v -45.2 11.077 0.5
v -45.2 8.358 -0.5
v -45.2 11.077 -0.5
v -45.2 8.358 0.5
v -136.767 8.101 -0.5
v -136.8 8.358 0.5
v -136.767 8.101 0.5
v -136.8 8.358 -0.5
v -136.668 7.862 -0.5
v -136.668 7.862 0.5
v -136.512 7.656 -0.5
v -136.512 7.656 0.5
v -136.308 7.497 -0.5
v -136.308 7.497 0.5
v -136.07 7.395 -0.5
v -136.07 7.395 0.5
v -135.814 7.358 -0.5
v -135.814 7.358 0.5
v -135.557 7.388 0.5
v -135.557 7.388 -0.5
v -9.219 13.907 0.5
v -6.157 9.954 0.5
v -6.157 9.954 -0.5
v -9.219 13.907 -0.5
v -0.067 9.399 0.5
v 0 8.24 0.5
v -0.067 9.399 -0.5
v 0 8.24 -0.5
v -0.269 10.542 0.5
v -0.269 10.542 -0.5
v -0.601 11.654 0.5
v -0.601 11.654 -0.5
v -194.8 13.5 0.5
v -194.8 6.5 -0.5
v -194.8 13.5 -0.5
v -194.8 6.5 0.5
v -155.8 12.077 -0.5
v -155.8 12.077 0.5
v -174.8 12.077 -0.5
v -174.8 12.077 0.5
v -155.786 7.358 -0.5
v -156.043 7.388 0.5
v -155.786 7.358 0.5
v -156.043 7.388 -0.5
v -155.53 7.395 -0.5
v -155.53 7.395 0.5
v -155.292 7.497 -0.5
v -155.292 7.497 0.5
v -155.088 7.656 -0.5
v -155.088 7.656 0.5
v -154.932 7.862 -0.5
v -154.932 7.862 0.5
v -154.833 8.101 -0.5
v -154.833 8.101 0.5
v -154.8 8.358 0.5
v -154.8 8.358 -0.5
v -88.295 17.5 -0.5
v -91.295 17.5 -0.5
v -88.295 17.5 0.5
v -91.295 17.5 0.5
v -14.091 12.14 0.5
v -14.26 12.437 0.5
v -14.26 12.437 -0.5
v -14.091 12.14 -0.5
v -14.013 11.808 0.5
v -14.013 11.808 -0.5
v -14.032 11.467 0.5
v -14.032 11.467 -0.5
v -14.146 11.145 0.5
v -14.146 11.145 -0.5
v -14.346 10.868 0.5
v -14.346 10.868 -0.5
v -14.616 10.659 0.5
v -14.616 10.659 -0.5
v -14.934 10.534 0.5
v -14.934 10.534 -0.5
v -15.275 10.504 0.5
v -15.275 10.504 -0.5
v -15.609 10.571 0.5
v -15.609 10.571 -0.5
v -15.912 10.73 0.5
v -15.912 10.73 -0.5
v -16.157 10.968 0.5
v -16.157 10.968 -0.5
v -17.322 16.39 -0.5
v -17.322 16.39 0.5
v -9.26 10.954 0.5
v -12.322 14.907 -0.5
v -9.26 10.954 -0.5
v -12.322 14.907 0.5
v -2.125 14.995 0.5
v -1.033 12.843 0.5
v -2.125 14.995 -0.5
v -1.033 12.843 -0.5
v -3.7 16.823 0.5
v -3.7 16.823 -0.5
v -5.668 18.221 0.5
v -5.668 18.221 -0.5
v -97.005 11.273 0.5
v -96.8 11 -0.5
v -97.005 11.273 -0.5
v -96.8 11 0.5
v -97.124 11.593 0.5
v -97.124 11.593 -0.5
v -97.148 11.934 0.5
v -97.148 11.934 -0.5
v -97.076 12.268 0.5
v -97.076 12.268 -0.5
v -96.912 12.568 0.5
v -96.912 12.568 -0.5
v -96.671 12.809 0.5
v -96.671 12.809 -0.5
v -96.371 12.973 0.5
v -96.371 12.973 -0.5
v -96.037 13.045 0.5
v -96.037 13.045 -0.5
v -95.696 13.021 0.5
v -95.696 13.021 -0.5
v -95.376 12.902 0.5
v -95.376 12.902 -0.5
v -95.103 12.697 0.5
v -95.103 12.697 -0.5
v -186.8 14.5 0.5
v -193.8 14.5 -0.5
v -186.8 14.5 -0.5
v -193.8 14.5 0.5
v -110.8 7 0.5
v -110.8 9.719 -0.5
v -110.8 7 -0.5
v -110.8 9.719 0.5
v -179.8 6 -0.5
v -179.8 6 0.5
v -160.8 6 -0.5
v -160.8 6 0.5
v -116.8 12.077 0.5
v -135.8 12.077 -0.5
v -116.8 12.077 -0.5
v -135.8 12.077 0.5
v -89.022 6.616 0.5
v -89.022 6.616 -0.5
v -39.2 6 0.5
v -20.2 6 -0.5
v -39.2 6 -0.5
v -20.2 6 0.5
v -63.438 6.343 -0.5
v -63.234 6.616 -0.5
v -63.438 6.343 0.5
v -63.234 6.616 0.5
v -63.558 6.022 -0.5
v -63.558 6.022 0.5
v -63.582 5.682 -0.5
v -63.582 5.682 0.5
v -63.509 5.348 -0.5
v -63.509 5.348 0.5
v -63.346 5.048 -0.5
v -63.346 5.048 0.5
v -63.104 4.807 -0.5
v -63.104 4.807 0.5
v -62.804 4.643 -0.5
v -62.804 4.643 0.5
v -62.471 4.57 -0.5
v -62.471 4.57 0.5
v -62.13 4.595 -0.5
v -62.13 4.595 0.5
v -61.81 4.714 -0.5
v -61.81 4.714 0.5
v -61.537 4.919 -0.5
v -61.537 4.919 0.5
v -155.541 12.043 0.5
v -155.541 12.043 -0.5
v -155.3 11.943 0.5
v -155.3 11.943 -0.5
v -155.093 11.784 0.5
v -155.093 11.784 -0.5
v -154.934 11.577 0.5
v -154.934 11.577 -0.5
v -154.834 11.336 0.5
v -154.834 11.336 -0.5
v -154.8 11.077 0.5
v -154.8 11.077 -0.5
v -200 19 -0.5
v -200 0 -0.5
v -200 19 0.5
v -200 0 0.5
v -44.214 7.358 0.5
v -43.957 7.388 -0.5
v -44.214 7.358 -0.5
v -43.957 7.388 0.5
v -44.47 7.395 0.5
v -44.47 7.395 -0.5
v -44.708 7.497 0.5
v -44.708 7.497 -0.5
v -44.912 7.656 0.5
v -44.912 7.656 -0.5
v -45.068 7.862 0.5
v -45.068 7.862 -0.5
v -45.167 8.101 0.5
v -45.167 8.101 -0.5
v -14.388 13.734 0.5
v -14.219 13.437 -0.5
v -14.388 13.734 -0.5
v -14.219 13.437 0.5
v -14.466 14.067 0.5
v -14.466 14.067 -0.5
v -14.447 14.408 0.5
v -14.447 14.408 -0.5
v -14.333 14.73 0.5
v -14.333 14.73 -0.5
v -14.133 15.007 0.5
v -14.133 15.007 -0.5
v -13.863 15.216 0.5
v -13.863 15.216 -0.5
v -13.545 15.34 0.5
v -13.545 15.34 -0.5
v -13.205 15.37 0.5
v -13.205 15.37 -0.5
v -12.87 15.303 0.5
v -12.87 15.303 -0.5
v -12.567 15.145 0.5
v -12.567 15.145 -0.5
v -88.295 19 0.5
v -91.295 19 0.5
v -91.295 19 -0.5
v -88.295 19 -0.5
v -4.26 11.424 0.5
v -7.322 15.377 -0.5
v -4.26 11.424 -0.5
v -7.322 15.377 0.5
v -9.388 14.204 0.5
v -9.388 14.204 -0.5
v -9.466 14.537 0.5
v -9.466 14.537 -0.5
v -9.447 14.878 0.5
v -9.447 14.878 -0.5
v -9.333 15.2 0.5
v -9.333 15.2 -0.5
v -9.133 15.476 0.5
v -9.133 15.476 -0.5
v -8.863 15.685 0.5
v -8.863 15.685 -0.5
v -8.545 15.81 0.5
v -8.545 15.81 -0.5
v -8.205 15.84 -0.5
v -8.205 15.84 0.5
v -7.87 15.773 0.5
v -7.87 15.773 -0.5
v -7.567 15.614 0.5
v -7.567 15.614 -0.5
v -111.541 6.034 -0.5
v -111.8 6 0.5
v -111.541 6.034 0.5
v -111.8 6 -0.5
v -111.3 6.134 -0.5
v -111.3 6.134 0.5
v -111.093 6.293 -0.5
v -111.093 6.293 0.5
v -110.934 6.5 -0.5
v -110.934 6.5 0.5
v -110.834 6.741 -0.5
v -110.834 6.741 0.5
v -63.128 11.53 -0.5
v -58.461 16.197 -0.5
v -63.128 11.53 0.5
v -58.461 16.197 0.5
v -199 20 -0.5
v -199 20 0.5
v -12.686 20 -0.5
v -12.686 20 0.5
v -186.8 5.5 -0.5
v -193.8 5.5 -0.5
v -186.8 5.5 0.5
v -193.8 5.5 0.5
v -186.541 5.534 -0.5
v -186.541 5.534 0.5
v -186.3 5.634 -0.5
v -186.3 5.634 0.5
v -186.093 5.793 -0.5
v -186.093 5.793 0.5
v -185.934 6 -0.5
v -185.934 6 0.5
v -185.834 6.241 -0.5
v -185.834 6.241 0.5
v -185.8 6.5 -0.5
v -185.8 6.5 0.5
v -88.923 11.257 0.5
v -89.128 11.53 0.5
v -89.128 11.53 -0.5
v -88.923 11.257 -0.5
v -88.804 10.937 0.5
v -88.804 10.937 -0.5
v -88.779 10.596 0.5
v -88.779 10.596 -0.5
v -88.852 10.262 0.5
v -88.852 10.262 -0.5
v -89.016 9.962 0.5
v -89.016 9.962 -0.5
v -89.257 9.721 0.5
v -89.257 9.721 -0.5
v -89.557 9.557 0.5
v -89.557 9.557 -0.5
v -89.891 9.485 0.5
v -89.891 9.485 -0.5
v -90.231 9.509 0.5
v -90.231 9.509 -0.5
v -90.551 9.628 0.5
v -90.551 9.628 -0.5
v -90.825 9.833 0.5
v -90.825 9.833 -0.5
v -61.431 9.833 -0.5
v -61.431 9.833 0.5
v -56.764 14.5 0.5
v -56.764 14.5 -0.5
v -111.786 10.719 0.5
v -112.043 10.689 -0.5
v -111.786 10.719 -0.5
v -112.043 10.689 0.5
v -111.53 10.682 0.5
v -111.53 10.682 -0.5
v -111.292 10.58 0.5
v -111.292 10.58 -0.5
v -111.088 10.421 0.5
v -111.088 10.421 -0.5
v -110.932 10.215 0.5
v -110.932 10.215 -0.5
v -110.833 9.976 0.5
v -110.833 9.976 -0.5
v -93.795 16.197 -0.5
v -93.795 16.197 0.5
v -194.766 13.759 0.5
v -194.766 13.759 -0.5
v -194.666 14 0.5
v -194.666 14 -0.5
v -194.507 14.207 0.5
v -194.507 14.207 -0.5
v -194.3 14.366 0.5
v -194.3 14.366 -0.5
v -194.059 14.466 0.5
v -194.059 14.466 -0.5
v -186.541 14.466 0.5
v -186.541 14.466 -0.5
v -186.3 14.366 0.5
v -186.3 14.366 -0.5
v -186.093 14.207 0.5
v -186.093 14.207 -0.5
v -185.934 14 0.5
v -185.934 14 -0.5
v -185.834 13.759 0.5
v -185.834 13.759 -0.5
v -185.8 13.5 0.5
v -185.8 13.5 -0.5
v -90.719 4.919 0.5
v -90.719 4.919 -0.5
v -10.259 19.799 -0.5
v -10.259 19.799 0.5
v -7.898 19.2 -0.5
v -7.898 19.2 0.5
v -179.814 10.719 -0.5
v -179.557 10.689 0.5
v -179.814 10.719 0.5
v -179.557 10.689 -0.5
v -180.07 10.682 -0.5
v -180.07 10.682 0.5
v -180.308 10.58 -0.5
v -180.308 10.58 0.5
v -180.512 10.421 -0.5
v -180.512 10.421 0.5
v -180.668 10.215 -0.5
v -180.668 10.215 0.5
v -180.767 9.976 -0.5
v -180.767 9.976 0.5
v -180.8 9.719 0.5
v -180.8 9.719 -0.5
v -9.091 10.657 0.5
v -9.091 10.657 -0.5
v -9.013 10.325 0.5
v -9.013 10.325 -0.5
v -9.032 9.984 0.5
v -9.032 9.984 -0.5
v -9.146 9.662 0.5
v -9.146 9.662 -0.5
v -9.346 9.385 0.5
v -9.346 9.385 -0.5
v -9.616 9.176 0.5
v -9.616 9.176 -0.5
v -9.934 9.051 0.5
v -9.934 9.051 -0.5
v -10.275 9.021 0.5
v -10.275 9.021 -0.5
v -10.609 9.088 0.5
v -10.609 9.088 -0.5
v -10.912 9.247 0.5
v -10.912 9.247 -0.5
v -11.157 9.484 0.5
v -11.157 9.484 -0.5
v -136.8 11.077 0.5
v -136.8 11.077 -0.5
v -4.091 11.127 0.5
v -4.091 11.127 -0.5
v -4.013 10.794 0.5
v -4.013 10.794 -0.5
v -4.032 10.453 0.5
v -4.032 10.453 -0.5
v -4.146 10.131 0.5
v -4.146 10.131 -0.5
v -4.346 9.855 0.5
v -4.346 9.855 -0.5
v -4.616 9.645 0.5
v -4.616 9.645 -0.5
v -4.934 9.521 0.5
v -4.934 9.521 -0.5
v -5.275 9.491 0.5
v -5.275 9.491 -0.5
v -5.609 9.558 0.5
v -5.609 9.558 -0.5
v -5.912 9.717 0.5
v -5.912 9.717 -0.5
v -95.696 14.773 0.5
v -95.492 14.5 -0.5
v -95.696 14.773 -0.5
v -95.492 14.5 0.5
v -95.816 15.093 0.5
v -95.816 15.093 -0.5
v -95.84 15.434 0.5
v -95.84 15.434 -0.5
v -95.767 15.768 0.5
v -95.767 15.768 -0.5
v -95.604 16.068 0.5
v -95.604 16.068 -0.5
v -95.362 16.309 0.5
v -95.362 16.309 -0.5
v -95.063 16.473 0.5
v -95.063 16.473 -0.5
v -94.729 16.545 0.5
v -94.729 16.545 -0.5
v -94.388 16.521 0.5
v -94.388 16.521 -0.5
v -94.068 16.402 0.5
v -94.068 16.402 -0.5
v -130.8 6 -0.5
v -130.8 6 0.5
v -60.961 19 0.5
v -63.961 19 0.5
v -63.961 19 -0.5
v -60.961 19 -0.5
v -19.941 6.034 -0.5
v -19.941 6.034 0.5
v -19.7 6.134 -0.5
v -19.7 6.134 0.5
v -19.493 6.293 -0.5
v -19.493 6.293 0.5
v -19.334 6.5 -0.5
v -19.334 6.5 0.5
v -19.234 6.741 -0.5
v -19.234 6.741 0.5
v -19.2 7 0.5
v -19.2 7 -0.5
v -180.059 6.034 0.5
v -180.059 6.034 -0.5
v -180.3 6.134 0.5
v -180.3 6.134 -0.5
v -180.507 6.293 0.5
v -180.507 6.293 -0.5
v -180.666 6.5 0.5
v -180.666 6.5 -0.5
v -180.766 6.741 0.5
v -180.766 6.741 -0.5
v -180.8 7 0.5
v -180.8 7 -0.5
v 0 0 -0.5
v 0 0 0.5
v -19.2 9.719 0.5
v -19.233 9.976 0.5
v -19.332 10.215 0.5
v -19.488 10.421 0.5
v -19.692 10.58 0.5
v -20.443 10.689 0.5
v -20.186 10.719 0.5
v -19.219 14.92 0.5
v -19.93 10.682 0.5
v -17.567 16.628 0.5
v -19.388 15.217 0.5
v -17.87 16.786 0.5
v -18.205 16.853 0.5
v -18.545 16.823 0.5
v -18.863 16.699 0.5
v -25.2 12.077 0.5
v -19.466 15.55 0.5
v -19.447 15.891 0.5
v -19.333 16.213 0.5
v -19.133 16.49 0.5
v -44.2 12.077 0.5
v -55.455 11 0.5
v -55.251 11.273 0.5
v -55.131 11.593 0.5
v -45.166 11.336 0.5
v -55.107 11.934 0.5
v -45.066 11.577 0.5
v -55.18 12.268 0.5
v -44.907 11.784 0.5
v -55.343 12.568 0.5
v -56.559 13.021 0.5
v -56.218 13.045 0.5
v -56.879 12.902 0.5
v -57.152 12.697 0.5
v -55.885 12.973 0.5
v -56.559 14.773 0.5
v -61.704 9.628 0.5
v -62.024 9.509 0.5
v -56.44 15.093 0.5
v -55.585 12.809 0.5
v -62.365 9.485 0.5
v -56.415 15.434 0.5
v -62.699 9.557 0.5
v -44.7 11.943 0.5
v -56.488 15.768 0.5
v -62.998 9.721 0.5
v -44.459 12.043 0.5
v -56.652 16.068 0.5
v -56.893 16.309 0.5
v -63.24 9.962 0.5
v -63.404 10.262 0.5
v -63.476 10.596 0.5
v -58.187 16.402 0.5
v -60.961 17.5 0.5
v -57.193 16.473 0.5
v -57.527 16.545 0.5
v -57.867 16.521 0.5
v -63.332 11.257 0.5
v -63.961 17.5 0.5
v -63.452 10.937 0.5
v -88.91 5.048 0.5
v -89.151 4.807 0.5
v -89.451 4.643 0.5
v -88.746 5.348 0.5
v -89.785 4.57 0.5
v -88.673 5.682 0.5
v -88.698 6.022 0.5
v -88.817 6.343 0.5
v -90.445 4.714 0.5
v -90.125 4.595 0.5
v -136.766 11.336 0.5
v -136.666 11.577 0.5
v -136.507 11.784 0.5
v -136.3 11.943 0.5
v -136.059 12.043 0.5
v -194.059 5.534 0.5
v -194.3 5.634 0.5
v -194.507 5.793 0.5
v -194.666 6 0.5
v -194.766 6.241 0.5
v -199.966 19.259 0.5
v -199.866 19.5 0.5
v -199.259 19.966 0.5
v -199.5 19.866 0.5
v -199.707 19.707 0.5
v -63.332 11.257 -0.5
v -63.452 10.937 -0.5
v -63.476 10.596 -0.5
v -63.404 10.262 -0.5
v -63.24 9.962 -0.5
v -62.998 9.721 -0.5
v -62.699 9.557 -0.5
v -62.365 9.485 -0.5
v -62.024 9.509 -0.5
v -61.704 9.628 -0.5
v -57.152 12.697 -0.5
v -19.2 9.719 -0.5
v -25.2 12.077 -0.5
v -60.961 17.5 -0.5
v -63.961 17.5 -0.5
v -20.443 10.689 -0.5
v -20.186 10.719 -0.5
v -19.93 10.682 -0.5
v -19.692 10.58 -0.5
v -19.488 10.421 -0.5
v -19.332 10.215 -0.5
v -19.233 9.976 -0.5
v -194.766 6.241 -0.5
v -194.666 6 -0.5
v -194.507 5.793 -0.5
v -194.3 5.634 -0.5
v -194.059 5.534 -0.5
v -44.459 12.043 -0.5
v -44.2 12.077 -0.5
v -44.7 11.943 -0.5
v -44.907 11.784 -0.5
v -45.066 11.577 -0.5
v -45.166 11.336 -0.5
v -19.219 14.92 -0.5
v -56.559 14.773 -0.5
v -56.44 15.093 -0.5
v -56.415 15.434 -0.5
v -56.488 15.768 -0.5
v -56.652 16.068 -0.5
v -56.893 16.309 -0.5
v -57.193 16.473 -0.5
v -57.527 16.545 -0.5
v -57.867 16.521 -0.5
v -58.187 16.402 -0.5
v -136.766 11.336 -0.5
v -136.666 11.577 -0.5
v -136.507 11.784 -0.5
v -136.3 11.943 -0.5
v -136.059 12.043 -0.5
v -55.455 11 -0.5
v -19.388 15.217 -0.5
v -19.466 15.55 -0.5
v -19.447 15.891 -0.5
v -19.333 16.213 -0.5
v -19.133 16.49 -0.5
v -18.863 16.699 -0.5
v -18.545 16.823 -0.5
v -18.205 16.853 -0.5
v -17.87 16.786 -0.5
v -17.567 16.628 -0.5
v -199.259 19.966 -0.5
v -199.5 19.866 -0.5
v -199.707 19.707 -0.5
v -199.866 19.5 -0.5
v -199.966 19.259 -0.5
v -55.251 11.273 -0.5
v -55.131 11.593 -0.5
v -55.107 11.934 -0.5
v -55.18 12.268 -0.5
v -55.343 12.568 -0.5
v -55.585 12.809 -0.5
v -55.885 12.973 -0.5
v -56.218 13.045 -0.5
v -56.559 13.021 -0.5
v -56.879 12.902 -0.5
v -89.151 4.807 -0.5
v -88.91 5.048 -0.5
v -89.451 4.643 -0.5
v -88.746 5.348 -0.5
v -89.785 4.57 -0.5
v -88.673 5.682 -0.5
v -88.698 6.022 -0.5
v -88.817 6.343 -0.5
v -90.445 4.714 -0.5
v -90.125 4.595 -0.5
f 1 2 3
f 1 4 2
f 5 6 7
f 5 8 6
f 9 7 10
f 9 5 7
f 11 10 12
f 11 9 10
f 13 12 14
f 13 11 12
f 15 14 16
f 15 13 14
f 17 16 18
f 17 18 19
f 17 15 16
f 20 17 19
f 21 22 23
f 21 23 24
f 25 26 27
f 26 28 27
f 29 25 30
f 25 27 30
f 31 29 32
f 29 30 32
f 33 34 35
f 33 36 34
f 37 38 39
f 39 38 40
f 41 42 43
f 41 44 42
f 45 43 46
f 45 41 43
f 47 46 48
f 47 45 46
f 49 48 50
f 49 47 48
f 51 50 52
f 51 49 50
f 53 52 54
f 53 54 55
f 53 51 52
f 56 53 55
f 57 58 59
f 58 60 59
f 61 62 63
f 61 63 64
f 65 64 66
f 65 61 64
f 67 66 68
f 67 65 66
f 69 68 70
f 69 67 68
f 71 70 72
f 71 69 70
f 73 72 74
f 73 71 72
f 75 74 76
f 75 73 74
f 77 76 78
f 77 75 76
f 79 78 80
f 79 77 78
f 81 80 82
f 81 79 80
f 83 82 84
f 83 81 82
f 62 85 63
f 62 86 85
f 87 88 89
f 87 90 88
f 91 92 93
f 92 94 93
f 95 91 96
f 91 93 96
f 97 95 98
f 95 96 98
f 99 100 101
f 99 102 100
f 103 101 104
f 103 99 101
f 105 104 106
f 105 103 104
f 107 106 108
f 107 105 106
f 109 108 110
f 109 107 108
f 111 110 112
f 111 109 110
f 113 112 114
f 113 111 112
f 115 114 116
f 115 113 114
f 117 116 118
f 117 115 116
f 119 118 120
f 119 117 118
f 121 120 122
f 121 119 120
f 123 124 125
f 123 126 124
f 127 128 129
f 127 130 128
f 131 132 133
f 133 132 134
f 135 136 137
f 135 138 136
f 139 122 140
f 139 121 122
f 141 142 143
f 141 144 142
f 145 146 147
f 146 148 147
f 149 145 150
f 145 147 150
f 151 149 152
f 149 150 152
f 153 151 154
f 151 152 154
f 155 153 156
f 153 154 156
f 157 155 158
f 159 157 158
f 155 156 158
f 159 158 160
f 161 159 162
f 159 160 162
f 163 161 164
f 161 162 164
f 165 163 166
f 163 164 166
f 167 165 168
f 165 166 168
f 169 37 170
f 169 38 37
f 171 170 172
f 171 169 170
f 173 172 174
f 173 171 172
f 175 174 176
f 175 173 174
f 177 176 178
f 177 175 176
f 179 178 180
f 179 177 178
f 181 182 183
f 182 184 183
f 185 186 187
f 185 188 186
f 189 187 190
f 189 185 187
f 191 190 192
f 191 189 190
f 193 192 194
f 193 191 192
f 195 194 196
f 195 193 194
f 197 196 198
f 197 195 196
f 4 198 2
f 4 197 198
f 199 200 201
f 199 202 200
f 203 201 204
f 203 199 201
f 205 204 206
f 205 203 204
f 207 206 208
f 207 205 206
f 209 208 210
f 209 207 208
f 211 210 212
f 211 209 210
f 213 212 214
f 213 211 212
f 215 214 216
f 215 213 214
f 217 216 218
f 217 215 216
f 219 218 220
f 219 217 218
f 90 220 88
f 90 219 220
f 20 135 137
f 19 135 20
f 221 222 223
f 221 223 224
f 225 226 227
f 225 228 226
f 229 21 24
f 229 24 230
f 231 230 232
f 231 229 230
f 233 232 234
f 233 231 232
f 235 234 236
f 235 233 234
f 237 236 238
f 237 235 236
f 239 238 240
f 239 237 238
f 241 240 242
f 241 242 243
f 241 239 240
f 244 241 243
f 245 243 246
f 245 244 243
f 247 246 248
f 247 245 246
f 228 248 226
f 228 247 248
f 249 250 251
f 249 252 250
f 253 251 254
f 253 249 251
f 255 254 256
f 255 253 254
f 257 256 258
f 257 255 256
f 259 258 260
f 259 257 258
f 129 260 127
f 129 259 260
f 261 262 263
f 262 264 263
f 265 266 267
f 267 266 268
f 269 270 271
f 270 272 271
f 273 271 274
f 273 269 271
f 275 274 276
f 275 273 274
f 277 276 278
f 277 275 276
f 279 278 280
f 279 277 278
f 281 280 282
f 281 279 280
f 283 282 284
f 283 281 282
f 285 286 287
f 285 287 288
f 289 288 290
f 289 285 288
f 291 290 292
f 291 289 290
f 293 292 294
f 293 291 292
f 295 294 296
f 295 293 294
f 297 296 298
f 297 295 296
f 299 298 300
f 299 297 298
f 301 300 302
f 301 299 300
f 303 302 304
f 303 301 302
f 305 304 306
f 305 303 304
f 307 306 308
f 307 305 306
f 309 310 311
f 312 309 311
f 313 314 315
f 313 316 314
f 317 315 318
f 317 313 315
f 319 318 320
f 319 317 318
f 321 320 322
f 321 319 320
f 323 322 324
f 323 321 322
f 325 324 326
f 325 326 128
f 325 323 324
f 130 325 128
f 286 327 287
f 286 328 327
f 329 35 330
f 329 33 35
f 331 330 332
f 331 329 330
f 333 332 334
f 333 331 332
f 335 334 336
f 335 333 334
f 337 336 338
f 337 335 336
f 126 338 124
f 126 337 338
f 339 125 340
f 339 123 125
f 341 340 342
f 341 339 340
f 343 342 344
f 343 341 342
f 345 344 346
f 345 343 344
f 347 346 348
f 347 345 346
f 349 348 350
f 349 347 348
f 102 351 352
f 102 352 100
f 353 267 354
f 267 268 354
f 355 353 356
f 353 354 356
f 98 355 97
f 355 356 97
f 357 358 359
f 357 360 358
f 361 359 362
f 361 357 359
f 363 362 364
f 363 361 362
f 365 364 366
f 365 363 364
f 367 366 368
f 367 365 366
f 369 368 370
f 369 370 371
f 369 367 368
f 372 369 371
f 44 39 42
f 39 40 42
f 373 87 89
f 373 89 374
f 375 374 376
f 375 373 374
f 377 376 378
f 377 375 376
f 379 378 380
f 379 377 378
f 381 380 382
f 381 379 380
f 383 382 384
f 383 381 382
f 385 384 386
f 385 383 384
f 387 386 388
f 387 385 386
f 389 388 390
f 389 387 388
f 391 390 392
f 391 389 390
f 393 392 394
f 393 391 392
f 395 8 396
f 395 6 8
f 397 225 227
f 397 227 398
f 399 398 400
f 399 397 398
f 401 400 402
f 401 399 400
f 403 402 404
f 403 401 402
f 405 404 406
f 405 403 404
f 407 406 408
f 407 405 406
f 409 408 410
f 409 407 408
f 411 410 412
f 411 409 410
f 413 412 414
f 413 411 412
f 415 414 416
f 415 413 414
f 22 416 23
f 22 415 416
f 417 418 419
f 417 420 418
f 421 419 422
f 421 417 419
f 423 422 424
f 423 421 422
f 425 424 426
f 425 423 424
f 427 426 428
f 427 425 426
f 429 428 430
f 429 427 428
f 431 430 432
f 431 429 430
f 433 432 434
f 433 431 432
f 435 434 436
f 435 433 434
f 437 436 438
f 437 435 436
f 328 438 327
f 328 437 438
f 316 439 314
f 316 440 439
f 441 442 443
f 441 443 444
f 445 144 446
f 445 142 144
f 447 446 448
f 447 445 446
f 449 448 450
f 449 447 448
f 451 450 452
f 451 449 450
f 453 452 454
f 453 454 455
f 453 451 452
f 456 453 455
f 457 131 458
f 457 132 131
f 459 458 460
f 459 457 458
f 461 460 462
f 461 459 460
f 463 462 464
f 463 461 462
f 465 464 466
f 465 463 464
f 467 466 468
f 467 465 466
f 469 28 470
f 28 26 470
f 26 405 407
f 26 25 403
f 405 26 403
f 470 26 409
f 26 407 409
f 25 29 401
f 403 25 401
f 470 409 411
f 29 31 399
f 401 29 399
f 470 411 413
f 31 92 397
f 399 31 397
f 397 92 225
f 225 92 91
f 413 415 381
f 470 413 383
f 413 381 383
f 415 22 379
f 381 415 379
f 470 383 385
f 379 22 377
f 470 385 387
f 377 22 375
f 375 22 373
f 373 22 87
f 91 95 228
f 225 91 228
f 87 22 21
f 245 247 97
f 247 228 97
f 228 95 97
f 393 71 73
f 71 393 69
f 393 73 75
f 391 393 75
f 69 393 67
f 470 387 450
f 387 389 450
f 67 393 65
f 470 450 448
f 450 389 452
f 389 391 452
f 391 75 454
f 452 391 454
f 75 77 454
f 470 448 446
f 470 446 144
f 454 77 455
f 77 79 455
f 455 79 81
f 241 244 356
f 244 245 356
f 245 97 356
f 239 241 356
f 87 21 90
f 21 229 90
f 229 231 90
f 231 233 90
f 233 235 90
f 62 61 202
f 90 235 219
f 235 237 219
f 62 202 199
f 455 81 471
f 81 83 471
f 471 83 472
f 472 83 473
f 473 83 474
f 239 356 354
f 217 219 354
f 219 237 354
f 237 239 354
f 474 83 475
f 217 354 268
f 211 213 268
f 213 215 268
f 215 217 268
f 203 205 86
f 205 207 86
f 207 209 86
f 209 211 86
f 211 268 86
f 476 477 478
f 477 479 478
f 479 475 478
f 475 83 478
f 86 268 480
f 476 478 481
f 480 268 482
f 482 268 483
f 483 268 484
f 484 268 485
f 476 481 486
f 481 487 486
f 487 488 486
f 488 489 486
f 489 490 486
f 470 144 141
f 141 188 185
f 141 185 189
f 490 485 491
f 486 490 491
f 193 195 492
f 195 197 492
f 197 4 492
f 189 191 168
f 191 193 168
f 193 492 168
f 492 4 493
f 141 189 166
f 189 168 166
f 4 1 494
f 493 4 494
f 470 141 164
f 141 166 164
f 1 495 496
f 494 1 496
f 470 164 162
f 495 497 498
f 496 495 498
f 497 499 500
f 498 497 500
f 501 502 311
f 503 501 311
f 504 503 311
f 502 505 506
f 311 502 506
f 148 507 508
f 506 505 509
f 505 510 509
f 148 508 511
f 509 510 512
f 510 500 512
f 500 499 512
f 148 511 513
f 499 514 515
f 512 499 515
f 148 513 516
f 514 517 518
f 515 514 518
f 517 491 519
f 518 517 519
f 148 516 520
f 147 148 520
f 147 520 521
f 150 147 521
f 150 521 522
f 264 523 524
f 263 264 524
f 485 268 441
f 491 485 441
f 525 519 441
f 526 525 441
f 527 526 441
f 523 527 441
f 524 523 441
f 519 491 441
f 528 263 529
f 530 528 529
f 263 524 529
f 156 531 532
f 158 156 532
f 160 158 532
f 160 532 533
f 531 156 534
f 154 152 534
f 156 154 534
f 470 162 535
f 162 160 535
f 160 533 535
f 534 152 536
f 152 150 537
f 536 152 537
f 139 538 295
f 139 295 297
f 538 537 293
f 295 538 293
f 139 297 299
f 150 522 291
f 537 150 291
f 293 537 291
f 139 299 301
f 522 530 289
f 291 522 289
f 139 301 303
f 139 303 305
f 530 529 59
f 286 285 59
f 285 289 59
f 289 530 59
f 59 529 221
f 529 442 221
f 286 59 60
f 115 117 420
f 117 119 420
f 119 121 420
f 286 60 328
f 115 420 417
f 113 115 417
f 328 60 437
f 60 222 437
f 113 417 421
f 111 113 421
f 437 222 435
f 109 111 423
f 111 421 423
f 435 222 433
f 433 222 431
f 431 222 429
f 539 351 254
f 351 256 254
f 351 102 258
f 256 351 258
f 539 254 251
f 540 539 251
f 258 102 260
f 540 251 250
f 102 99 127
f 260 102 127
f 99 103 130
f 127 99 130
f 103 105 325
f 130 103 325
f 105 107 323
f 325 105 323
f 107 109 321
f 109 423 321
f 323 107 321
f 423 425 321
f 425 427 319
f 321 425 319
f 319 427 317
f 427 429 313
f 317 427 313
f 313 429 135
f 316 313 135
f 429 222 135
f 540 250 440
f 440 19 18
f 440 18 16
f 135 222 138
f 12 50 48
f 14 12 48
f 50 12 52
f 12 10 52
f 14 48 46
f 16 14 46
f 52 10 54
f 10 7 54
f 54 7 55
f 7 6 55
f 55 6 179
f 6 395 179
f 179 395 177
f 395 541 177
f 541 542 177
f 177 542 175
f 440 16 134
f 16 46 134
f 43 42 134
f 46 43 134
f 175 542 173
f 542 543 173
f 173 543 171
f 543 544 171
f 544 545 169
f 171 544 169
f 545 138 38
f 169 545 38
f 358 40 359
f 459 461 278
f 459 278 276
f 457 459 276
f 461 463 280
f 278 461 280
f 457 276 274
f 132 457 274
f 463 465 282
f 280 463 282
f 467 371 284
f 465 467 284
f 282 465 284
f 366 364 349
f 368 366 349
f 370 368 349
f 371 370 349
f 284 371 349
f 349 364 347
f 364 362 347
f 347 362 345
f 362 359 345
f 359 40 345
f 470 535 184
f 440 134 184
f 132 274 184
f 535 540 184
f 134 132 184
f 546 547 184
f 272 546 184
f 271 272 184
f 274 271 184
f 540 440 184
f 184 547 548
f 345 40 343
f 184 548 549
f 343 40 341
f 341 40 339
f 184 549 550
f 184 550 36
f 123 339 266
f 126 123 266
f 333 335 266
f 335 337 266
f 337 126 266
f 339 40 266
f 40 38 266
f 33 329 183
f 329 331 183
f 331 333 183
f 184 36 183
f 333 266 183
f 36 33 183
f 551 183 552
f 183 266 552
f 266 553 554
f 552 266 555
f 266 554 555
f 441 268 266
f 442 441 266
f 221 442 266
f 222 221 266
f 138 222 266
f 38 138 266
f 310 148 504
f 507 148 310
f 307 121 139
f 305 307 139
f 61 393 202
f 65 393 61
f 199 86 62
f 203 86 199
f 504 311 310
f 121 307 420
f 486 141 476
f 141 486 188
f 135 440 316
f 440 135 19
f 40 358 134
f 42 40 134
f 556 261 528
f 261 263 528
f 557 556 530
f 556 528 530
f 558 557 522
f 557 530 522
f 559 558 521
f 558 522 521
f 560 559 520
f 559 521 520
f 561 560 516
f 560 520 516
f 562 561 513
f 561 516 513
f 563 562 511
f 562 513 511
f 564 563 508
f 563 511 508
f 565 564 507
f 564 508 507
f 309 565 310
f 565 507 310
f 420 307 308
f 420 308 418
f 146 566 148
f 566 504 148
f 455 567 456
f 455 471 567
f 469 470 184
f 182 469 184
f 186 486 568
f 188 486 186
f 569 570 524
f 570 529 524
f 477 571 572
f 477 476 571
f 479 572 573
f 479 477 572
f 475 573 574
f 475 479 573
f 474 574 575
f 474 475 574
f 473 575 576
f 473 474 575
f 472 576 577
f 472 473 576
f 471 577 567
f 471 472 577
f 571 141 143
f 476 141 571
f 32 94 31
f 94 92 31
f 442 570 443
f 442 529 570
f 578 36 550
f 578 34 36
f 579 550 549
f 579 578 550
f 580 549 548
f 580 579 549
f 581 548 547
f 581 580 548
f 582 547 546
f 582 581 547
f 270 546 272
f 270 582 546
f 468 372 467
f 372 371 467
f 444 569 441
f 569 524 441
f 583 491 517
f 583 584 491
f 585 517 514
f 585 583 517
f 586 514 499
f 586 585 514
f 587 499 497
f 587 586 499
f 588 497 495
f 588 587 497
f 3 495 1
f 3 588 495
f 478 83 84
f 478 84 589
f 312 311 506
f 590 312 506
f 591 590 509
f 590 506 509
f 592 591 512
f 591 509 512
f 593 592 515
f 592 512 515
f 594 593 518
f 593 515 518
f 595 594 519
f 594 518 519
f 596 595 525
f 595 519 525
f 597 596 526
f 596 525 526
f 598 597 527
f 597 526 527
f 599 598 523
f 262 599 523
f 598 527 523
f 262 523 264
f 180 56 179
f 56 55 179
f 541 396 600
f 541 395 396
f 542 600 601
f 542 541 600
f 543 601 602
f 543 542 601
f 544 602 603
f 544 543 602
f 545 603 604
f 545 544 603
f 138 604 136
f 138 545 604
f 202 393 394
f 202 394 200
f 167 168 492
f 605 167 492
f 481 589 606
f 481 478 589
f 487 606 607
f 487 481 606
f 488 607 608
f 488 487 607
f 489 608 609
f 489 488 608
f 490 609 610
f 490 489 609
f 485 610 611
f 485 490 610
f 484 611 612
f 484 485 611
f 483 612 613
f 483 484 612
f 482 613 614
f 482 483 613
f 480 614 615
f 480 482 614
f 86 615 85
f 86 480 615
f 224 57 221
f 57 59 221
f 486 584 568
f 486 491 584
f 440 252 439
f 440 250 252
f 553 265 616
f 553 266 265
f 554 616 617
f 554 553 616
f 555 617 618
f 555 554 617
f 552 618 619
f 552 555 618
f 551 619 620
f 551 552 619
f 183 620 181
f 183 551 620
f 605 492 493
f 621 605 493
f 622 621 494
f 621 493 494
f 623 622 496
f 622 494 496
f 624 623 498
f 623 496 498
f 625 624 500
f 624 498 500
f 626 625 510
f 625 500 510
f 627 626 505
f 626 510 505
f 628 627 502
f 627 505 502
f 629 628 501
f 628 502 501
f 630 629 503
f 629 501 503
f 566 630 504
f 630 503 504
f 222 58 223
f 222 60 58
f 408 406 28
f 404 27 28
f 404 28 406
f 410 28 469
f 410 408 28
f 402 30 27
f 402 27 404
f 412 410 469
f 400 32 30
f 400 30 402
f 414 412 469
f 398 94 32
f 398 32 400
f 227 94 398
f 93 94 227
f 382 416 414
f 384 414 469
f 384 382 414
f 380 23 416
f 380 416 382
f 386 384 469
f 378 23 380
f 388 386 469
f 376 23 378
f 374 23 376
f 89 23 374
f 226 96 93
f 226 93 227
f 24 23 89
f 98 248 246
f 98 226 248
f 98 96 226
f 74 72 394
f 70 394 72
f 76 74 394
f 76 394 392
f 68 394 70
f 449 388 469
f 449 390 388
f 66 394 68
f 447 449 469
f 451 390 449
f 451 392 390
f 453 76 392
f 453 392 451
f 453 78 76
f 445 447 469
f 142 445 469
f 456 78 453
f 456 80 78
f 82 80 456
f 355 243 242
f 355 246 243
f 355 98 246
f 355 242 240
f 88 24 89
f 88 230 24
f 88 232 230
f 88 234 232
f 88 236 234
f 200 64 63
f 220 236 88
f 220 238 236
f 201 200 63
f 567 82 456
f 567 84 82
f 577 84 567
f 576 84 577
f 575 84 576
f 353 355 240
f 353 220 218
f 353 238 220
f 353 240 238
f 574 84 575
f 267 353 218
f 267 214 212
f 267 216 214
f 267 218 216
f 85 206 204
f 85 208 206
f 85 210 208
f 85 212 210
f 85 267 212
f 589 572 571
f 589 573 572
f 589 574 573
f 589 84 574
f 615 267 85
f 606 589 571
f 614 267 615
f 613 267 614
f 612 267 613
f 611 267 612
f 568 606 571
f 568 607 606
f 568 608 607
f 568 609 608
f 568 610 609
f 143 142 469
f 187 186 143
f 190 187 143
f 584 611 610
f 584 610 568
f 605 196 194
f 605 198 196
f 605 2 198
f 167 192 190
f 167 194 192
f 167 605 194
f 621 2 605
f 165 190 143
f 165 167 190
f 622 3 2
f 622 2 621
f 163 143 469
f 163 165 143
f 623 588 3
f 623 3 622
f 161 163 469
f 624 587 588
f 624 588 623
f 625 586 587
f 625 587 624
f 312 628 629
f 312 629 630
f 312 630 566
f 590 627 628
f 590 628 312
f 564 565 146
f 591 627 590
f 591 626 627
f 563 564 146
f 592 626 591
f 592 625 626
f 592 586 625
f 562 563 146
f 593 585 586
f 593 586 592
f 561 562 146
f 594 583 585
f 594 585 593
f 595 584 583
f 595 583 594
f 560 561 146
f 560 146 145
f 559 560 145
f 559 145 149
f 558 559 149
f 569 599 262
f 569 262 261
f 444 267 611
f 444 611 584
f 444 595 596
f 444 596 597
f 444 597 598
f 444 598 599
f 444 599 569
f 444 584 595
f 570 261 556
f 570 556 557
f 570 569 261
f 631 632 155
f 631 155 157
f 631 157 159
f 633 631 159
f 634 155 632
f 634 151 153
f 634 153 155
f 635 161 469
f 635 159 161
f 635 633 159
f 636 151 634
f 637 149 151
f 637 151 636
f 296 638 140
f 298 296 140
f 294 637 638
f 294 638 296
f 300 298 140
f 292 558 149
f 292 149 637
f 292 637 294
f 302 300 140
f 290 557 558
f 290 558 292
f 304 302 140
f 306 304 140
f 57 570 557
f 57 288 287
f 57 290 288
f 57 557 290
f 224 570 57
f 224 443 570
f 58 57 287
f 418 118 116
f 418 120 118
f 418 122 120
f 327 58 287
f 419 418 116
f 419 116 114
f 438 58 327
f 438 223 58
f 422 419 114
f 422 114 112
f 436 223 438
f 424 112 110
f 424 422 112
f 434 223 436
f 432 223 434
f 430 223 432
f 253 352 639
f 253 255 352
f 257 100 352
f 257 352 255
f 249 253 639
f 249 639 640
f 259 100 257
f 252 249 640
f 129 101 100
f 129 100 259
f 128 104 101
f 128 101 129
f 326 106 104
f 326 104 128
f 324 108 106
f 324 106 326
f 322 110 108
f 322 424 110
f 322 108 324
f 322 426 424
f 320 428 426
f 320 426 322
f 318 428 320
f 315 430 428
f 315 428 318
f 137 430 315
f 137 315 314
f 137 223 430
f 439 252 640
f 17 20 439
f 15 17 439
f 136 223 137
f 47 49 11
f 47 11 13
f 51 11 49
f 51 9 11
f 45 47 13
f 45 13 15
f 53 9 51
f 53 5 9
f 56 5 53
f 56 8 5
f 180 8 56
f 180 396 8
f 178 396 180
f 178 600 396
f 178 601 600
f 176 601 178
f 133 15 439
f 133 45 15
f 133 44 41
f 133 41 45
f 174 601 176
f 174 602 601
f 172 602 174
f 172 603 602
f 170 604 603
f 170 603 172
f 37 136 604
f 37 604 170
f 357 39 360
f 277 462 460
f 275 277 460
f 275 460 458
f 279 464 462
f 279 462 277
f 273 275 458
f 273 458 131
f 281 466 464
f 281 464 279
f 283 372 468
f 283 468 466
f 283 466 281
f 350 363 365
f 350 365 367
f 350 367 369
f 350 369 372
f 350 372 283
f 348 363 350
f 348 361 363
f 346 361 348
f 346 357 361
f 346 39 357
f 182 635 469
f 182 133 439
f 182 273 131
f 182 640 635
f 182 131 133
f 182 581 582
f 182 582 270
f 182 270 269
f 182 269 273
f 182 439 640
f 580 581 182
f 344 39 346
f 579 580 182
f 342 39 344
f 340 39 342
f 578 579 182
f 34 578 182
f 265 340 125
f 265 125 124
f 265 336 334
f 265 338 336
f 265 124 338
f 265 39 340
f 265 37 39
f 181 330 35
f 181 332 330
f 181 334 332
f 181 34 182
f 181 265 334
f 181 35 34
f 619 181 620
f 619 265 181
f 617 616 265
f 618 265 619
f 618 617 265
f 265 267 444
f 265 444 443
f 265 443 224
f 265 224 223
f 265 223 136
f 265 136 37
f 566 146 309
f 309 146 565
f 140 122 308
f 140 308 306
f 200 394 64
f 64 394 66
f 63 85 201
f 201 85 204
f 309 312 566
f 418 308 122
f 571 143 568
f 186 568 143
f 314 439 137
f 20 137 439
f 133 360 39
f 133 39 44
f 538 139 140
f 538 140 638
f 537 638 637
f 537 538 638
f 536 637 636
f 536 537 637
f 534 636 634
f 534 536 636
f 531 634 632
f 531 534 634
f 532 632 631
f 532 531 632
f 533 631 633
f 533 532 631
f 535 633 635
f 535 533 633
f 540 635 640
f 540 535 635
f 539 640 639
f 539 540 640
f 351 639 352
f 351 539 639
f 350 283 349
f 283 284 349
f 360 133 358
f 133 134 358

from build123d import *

# Parameters (mm, degrees)
SKETCH1_W           = 9
SKETCH1_H           = 9
SKETCH1_W_2         = 3
SKETCH1_H_2         = 1.5
BOSS_EXTRUDE1_DEPTH = 0.5
FILLET1_R           = 10
FILLET3_R           = 1


with BuildPart() as part:
    # Sketch1 → Boss-Extrude1 (new, symmetric)
    with BuildSketch(Plane.XY):
        with BuildLine():
            Line((-200, 10), (-200, 20))
            Line((-200, 20), (-12.686273665, 20))
            ThreePointArc((-12.686273665, 20), (-6.83279553, 18.787212337), (-1.943060243, 15.348528137))
            Line((-1.943060243, 15.348528137), (0, 10))
            Line((0, 10), (0, 0))
            Line((0, 0), (-10, 0))
            Line((-10, 0), (-200, 0))
            Line((-200, 0), (-200, 10))
        make_face()
        Polygon((-180.8, 11), (-180.8, 6), (-160.8, 6), align=None, mode=Mode.SUBTRACT)
        with Locations((-190.3, 10)):
            Rectangle(SKETCH1_W, SKETCH1_H, mode=Mode.SUBTRACT)
        Polygon((-154.8, 7.076941016), (-154.8, 12.076941016), (-174.8, 12.076941016), align=None, mode=Mode.SUBTRACT)
        Polygon((-130.8, 6), (-110.8, 11), (-110.8, 6), align=None, mode=Mode.SUBTRACT)
        Polygon((-136.8, 7.076941016), (-136.8, 12.076941016), (-116.8, 12.076941016), align=None, mode=Mode.SUBTRACT)
        with BuildLine():
            Line((-95.102943725, 12.697056275), (-89.021825407, 6.615937957))
            ThreePointArc((-89.021825407, 6.615937957), (-89.021825407, 4.918881682), (-90.718881682, 4.918881682))
            Line((-90.718881682, 4.918881682), (-96.8, 11))
            ThreePointArc((-96.8, 11), (-96.8, 12.697056275), (-95.102943725, 12.697056275))
        make_face(mode=Mode.SUBTRACT)
        with BuildLine():
            Line((-93.794617613, 16.197056275), (-89.127712857, 11.530151519))
            ThreePointArc((-89.127712857, 11.530151519), (-89.127712857, 9.833095244), (-90.824769132, 9.833095244))
            Line((-90.824769132, 9.833095244), (-95.491673888, 14.5))
            ThreePointArc((-95.491673888, 14.5), (-95.491673888, 16.197056275), (-93.794617613, 16.197056275))
        make_face(mode=Mode.SUBTRACT)
        with Locations((-89.794617613, 18.25)):
            Rectangle(SKETCH1_W_2, SKETCH1_H_2, mode=Mode.SUBTRACT)
        with Locations((-62.460808101, 18.25)):
            Rectangle(SKETCH1_W_2, SKETCH1_H_2, mode=Mode.SUBTRACT)
        with BuildLine():
            Line((-58.460808101, 16.197056275), (-63.127712857, 11.530151519))
            ThreePointArc((-63.127712857, 11.530151519), (-63.127712857, 9.833095244), (-61.430656582, 9.833095244))
            Line((-61.430656582, 9.833095244), (-56.763751827, 14.5))
            ThreePointArc((-56.763751827, 14.5), (-56.763751827, 16.197056275), (-58.460808101, 16.197056275))
        make_face(mode=Mode.SUBTRACT)
        with BuildLine():
            Line((-57.152481989, 12.697056275), (-63.233600308, 6.615937957))
            ThreePointArc((-63.233600308, 6.615937957), (-63.233600308, 4.918881682), (-61.536544033, 4.918881682))
            Line((-61.536544033, 4.918881682), (-55.455425715, 11))
            ThreePointArc((-55.455425715, 11), (-55.455425715, 12.697056275), (-57.152481989, 12.697056275))
        make_face(mode=Mode.SUBTRACT)
        Polygon((-25.2, 12.076941016), (-45.2, 7.076941016), (-45.2, 12.076941016), align=None, mode=Mode.SUBTRACT)
        Polygon((-39.2, 6), (-19.2, 11), (-19.2, 6), align=None, mode=Mode.SUBTRACT)
        with BuildLine():
            Line((-17.321963125, 16.390064684), (-14.260022427, 12.437278431))
            ThreePointArc((-14.260022427, 12.437278431), (-14.47382536, 10.753743963), (-16.157359828, 10.967546896))
            Line((-16.157359828, 10.967546896), (-19.219300527, 14.920333149))
            ThreePointArc((-19.219300527, 14.920333149), (-19.005497594, 16.603867617), (-17.321963125, 16.390064684))
        make_face(mode=Mode.SUBTRACT)
        with BuildLine():
            Line((-12.321963125, 14.907009966), (-9.260022427, 10.954223713))
            ThreePointArc((-9.260022427, 10.954223713), (-9.47382536, 9.270689245), (-11.157359828, 9.484492178))
            Line((-11.157359828, 9.484492178), (-14.219300527, 13.437278431))
            ThreePointArc((-14.219300527, 13.437278431), (-14.005497594, 15.120812899), (-12.321963125, 14.907009966))
        make_face(mode=Mode.SUBTRACT)
        with BuildLine():
            Line((-7.321963125, 15.376741501), (-4.260022427, 11.423955248))
            ThreePointArc((-4.260022427, 11.423955248), (-4.47382536, 9.74042078), (-6.157359828, 9.954223713))
            Line((-6.157359828, 9.954223713), (-9.219300527, 13.907009966))
            ThreePointArc((-9.219300527, 13.907009966), (-9.005497594, 15.590544434), (-7.321963125, 15.376741501))
        make_face(mode=Mode.SUBTRACT)
    extrude(amount=BOSS_EXTRUDE1_DEPTH, both=True)

    # Fillet1
    fillet1_edges = [part.edges().sort_by_distance(p)[0] for p in [
        (0, 10, 0),
        (-1.943060243, 15.348528137, 0),
    ]]
    fillet(fillet1_edges, radius=FILLET1_R)

    # Fillet3
    fillet3_edges = [part.edges().sort_by_distance(p)[0] for p in [
        (-200, 20, 0),
        (-154.8, 7.076941016, 0),
        (-154.8, 12.076941016, 0),
        (-180.8, 11, 0),
        (-180.8, 6, 0),
        (-194.8, 14.5, 0),
        (-194.8, 5.5, 0),
        (-185.8, 5.5, 0),
        (-185.8, 14.5, 0),
        (-110.8, 6, 0),
        (-110.8, 11, 0),
        (-136.8, 7.076941016, 0),
        (-136.8, 12.076941016, 0),
        (-45.2, 12.076941016, 0),
        (-45.2, 7.076941016, 0),
        (-19.2, 6, 0),
        (-19.2, 11, 0),
    ]]
    fillet(fillet3_edges, radius=FILLET3_R)


solid = part.part
